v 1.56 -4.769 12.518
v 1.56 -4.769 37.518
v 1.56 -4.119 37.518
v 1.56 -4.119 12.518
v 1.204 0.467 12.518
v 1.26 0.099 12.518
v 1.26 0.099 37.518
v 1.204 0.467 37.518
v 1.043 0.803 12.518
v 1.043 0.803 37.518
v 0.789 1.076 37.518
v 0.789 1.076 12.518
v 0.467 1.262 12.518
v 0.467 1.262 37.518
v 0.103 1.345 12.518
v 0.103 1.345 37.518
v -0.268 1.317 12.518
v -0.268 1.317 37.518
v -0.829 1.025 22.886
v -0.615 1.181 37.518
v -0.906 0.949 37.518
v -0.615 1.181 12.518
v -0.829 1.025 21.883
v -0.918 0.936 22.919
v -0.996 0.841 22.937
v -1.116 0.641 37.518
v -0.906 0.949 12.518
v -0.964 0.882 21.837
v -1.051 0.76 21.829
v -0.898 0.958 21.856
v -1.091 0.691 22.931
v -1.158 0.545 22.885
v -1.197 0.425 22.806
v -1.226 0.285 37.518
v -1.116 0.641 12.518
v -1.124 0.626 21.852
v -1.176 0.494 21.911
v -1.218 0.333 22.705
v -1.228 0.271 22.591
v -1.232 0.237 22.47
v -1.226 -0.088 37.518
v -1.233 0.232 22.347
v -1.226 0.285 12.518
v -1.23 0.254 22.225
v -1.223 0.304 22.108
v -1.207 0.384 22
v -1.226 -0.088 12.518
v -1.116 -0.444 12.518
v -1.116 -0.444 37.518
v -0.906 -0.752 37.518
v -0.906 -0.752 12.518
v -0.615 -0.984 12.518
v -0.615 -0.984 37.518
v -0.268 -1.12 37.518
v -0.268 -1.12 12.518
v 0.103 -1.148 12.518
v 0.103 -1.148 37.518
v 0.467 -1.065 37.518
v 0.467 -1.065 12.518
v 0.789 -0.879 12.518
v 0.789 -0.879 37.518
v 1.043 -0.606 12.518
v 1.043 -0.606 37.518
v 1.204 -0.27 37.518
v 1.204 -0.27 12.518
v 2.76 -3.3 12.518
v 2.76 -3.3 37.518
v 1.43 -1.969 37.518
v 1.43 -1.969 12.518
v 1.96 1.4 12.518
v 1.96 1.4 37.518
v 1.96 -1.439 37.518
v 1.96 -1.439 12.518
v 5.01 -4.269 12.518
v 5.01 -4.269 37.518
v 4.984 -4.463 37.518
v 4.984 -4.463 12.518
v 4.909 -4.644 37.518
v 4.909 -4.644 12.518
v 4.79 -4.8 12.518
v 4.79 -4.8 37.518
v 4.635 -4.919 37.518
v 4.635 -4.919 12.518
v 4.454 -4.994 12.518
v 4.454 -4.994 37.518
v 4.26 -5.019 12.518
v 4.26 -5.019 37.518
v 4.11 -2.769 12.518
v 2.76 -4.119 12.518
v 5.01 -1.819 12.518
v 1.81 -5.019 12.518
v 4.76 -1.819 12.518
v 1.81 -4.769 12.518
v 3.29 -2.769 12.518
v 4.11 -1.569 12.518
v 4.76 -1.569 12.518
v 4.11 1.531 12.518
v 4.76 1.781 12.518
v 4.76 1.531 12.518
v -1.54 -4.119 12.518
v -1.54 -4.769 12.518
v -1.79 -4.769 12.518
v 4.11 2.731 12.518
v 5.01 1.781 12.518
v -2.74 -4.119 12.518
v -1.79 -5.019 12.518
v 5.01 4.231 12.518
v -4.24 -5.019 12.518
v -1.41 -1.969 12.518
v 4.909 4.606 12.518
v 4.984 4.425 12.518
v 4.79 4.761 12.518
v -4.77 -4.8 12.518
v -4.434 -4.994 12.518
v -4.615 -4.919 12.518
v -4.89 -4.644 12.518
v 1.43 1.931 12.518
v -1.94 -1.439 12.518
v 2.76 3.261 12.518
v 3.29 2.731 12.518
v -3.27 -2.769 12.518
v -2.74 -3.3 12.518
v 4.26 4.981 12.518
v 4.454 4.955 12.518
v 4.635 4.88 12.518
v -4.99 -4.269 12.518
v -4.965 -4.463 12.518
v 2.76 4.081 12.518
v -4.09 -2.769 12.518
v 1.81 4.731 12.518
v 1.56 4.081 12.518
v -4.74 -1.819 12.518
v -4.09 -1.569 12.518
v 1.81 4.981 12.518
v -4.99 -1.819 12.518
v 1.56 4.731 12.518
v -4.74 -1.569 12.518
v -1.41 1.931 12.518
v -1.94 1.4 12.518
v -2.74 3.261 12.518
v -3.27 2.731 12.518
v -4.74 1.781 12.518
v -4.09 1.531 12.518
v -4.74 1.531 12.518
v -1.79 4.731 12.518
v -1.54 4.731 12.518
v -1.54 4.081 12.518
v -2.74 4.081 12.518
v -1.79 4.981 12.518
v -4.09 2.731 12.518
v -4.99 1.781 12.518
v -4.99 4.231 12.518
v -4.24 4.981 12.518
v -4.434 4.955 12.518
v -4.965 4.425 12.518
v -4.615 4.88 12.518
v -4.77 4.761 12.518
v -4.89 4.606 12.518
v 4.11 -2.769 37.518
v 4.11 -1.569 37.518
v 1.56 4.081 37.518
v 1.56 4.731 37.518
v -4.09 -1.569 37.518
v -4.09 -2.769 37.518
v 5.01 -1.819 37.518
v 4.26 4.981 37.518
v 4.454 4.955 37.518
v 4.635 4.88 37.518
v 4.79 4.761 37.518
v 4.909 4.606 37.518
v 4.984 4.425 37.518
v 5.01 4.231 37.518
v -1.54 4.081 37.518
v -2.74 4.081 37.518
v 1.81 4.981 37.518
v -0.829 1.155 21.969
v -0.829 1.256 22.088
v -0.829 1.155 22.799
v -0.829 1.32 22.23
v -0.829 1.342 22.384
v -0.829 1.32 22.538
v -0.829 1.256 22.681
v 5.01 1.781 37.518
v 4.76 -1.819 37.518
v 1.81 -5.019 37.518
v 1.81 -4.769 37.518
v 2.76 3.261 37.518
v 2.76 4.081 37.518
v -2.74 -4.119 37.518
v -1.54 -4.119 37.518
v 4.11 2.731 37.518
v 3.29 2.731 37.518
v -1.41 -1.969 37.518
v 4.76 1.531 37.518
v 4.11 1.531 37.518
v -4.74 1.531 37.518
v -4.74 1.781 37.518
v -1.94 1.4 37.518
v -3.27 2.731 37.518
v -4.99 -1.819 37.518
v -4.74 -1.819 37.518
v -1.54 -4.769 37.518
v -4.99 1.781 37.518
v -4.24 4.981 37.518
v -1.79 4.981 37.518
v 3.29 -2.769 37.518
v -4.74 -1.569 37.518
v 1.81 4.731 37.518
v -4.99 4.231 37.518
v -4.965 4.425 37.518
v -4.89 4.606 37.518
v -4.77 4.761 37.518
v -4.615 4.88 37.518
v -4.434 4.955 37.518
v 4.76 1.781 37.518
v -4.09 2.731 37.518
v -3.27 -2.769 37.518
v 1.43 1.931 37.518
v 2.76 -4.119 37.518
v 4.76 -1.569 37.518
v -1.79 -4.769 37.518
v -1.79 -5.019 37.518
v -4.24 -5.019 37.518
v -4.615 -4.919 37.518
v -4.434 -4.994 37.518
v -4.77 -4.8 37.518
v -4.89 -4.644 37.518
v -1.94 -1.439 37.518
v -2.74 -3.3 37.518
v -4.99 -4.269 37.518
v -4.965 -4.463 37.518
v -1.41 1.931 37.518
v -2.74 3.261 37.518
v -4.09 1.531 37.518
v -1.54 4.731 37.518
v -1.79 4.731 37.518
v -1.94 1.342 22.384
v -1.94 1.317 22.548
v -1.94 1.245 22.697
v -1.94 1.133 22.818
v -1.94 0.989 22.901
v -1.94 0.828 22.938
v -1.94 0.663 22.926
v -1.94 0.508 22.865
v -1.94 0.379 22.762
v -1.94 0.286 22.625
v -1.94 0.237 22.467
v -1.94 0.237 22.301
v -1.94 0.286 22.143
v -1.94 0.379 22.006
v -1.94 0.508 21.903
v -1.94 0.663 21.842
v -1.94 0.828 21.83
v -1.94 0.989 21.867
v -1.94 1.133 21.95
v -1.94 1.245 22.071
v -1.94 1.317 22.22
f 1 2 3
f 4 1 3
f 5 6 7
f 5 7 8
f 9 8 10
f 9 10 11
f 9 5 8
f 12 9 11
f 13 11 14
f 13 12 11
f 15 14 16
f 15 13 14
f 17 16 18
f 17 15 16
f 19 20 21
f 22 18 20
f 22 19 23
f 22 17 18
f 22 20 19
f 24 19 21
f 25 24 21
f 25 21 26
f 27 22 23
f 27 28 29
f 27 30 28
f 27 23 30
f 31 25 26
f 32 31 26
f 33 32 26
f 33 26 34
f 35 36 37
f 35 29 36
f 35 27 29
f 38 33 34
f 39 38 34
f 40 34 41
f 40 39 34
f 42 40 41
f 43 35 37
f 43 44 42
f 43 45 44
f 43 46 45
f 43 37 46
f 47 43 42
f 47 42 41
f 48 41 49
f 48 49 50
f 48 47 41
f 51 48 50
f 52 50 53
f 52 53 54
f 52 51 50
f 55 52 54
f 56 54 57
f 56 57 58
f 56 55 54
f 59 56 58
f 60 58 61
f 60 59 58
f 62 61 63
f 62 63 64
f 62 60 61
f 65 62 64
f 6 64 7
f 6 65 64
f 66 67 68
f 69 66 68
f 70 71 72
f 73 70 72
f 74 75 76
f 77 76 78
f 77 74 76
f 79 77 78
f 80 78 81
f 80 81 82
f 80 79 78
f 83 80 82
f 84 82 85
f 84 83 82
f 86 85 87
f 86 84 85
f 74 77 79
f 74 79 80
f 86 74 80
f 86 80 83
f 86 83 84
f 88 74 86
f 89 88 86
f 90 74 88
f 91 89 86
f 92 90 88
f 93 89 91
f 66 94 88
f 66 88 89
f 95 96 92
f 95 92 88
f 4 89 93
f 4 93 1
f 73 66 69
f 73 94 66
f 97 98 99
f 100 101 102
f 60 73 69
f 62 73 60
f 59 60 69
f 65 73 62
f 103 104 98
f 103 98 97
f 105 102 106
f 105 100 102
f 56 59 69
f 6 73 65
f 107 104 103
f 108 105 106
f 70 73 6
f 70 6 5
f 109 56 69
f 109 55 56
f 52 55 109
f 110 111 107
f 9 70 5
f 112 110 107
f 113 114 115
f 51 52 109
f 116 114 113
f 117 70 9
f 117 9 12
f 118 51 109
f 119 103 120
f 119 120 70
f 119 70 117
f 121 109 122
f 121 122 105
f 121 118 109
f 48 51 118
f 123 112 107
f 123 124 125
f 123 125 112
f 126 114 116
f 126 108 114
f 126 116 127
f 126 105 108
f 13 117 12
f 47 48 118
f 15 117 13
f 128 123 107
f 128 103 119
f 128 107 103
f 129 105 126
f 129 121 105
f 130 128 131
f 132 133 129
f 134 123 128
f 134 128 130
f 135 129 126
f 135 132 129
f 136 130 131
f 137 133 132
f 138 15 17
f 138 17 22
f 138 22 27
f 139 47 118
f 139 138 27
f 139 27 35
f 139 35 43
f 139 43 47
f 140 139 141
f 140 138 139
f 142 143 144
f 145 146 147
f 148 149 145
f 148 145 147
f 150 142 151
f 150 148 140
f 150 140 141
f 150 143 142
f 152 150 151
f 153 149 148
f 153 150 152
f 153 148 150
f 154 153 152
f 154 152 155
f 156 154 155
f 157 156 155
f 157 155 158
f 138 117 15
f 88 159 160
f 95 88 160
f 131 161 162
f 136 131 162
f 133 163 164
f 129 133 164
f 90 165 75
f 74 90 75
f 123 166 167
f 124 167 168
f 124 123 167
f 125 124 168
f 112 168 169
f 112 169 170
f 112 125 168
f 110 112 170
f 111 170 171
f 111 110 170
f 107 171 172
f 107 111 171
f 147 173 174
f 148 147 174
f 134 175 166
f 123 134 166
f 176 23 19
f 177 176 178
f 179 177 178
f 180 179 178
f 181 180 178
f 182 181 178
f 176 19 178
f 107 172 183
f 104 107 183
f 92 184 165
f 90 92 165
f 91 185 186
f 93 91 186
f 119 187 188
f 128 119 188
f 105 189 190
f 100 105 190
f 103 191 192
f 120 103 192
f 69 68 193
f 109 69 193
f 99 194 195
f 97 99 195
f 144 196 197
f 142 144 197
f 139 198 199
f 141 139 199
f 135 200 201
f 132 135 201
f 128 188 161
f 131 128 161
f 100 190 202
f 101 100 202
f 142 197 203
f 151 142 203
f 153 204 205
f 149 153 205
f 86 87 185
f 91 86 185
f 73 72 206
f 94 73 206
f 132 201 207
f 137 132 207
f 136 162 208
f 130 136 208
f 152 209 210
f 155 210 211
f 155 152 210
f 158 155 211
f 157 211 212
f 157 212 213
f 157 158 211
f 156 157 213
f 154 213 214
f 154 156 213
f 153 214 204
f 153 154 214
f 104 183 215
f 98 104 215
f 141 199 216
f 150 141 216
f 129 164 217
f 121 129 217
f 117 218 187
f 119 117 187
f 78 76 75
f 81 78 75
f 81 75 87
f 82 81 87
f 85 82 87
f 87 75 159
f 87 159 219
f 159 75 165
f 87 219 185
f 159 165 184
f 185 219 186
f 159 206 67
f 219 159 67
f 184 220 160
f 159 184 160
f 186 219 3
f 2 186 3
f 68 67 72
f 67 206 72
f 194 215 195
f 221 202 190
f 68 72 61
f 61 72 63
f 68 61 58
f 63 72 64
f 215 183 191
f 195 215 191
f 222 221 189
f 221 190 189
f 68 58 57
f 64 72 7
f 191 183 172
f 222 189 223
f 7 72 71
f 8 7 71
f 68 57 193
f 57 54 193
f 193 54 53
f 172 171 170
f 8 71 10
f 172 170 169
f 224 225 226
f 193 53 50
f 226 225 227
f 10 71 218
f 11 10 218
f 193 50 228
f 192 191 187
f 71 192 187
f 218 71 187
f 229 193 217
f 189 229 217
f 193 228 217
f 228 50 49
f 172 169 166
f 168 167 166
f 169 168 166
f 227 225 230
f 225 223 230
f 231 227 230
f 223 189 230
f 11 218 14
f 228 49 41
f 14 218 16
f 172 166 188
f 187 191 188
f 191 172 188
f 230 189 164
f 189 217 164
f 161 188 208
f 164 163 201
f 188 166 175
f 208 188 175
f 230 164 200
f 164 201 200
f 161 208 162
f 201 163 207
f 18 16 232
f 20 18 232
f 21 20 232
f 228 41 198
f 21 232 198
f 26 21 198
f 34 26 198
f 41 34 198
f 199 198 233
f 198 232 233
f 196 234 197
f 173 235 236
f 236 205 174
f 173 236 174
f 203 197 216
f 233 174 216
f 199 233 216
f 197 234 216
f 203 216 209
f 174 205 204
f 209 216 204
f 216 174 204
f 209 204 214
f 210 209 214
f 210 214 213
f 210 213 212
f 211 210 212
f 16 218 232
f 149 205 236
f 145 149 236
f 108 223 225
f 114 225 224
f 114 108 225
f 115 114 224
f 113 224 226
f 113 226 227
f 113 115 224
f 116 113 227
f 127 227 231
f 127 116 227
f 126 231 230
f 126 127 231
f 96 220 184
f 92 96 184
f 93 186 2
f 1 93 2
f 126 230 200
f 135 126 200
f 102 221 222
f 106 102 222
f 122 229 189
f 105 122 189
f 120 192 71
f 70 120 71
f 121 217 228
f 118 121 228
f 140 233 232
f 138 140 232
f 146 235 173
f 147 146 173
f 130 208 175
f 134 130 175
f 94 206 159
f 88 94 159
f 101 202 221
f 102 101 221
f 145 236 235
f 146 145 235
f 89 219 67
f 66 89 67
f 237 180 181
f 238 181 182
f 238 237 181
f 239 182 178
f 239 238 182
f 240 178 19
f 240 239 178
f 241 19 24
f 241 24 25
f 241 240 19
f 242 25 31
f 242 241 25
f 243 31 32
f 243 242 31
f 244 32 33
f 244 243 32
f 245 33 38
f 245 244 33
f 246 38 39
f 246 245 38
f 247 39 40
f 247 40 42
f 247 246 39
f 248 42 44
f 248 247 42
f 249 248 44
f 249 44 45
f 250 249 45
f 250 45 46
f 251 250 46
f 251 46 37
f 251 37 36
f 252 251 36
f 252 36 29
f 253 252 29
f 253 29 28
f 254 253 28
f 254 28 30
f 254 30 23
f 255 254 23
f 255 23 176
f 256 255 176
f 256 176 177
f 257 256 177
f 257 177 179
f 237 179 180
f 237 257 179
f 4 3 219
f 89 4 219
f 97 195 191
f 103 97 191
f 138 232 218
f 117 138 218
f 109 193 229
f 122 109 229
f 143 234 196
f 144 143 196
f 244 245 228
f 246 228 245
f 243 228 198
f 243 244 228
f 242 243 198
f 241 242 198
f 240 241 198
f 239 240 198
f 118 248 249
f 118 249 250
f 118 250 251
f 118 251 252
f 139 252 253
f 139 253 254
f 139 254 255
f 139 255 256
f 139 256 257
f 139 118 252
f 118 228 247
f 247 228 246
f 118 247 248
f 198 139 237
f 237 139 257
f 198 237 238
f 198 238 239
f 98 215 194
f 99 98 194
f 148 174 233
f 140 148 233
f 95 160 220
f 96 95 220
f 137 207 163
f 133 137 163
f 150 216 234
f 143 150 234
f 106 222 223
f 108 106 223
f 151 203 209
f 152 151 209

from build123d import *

# Parameters (mm, degrees)
SKETCH1_R           = 2.5
BOSS_EXTRUDE1_DEPTH = 50
SCALE_2_SCALE       = 3
SCALE_3_SCALE       = 6
SCALE_5_SCALE       = 2
SCALE_6_SCALE       = 0.25
SCALE_7_SCALE       = 0.125
SCALE_8_SCALE       = 0.25
SCALE_9_SCALE       = 4
SCALE_10_SCALE      = 4
OTHER_START         = -17.55
OTHER_1_OUTLINE_R   = 5
OTHER_1_DEPTH       = 10
SCALE_11_SCALE      = 0.111111111


# Read off the part's stored shape, not the designer's step: 孔1
with BuildPart() as part:
    # Sketch1 → Boss-Extrude1 (new body)
    with BuildSketch(Plane.XY):
        with BuildLine():
            Line((2.839339828, 3.9), (5.5, 6.560660172))
            Line((5.5, 6.560660172), (5.5, 8.2))
            Line((5.5, 8.2), (3.1, 8.2))
            Line((3.1, 8.2), (3.1, 9.5))
            Line((3.1, 9.5), (3.6, 9.5))
            Line((3.6, 9.5), (3.6, 10))
            Line((3.6, 10), (8.5, 10))
            ThreePointArc((8.5, 10), (9.560660172, 9.560660172), (10, 8.5))
            Line((10, 8.5), (10, 3.6))
            Line((10, 3.6), (9.5, 3.6))
            Line((9.5, 3.6), (9.5, 3.1))
            Line((9.5, 3.1), (8.2, 3.1))
            Line((8.2, 3.1), (8.2, 5.5))
            Line((8.2, 5.5), (6.560660172, 5.5))
            Line((6.560660172, 5.5), (3.9, 2.839339828))
            Line((3.9, 2.839339828), (3.9, -2.839339828))
            Line((3.9, -2.839339828), (6.560660172, -5.5))
            Line((6.560660172, -5.5), (8.2, -5.5))
            Line((8.2, -5.5), (8.2, -3.1))
            Line((8.2, -3.1), (9.5, -3.1))
            Line((9.5, -3.1), (9.5, -3.6))
            Line((9.5, -3.6), (10, -3.6))
            Line((10, -3.6), (10, -8.5))
            ThreePointArc((10, -8.5), (9.560660172, -9.560660172), (8.5, -10))
            Line((8.5, -10), (3.6, -10))
            Line((3.6, -10), (3.6, -9.5))
            Line((3.6, -9.5), (3.1, -9.5))
            Line((3.1, -9.5), (3.1, -8.2))
            Line((3.1, -8.2), (5.5, -8.2))
            Line((5.5, -8.2), (5.5, -6.560660172))
            Line((5.5, -6.560660172), (2.839339828, -3.9))
            Line((2.839339828, -3.9), (-2.839339828, -3.9))
            Line((-2.839339828, -3.9), (-5.5, -6.560660172))
            Line((-5.5, -6.560660172), (-5.5, -8.2))
            Line((-5.5, -8.2), (-3.1, -8.2))
            Line((-3.1, -8.2), (-3.1, -9.5))
            Line((-3.1, -9.5), (-3.6, -9.5))
            Line((-3.6, -9.5), (-3.6, -10))
            Line((-3.6, -10), (-8.5, -10))
            ThreePointArc((-8.5, -10), (-9.560660172, -9.560660172), (-10, -8.5))
            Line((-10, -8.5), (-10, -3.6))
            Line((-10, -3.6), (-9.5, -3.6))
            Line((-9.5, -3.6), (-9.5, -3.1))
            Line((-9.5, -3.1), (-8.2, -3.1))
            Line((-8.2, -3.1), (-8.2, -5.5))
            Line((-8.2, -5.5), (-6.560660172, -5.5))
            Line((-6.560660172, -5.5), (-3.9, -2.839339828))
            Line((-3.9, -2.839339828), (-3.9, 2.839339828))
            Line((-3.9, 2.839339828), (-6.560660172, 5.5))
            Line((-6.560660172, 5.5), (-8.2, 5.5))
            Line((-8.2, 5.5), (-8.2, 3.1))
            Line((-8.2, 3.1), (-9.5, 3.1))
            Line((-9.5, 3.1), (-9.5, 3.6))
            Line((-9.5, 3.6), (-10, 3.6))
            Line((-10, 3.6), (-10, 8.5))
            ThreePointArc((-10, 8.5), (-9.560660172, 9.560660172), (-8.5, 10))
            Line((-8.5, 10), (-3.6, 10))
            Line((-3.6, 10), (-3.6, 9.5))
            Line((-3.6, 9.5), (-3.1, 9.5))
            Line((-3.1, 9.5), (-3.1, 8.2))
            Line((-3.1, 8.2), (-5.5, 8.2))
            Line((-5.5, 8.2), (-5.5, 6.560660172))
            Line((-5.5, 6.560660172), (-2.839339828, 3.9))
            Line((-2.839339828, 3.9), (2.839339828, 3.9))
        make_face()
        with Locations((0, 0.235847297)):
            Circle(SKETCH1_R, mode=Mode.SUBTRACT)
    extrude(amount=BOSS_EXTRUDE1_DEPTH)


with BuildPart() as part_1:
    # 缩放比例2: scaled about (0, -0.027095247, 25)
    add(part.part.scale(SCALE_2_SCALE).moved(Location((0, 0.054190494, -50))))


with BuildPart() as part_2:
    # 缩放比例3: scaled about (0, -0.027095247, 25)
    add(part_1.part.scale(SCALE_3_SCALE).moved(Location((0, 0.135476235, -125))))


with BuildPart() as part_3:
    # 缩放比例5: scaled about (0, -0.027095249, 25)
    add(part_2.part.scale(SCALE_5_SCALE).moved(Location((0, 0.027095249, -25))))


with BuildPart() as part_4:
    # 缩放比例6: scaled about (0, -0.027095249, 25)
    add(part_3.part.scale(SCALE_6_SCALE).moved(Location((0, -0.020321437, 18.75))))


with BuildPart() as part_5:
    # 缩放比例7: scaled about (0, -0.027095249, 25)
    add(part_4.part.scale(SCALE_7_SCALE).moved(Location((0, -0.023708343, 21.875))))


with BuildPart() as part_6:
    # 缩放比例8: scaled about (0, -0.027095249, 25)
    add(part_5.part.scale(SCALE_8_SCALE).moved(Location((0, -0.020321437, 18.75))))


with BuildPart() as part_7:
    # 缩放比例9: scaled about (0, -0.027095249, 25)
    add(part_6.part.scale(SCALE_9_SCALE).moved(Location((0, 0.081285747, -75))))


with BuildPart() as part_8:
    # 缩放比例10: scaled about (0, -0.027095249, 25)
    add(part_7.part.scale(SCALE_10_SCALE).moved(Location((0, 0.081285747, -75))))

    # 孔1 outline → 孔1 (cut)
    with BuildSketch(Plane.YZ.offset(OTHER_START)):
        with Locations((7.344833538, 1.297306883)):
            Circle(OTHER_1_OUTLINE_R)
    extrude(amount=OTHER_1_DEPTH, mode=Mode.SUBTRACT)


with BuildPart() as part_9:
    # 缩放比例11: scaled about (0.011151362, -0.033595737, 25.019879338)
    add(part_8.part.scale(SCALE_11_SCALE).moved(Location((0.009912322, -0.029862877, 22.239892745))))


solid = part_9.part
